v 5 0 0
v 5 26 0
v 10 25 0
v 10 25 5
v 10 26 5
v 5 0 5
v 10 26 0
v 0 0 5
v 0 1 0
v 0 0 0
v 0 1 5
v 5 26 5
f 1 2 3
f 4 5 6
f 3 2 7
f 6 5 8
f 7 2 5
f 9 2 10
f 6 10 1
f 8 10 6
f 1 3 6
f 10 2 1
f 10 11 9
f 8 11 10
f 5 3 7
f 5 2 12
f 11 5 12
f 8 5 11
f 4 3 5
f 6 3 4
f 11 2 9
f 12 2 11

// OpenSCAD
$width=10;
$height=2.5*$width;

// A
hull(){
    cube([5,1,5]);
    translate([$width/2,$height,0]) cube([5,1,5]);
}
